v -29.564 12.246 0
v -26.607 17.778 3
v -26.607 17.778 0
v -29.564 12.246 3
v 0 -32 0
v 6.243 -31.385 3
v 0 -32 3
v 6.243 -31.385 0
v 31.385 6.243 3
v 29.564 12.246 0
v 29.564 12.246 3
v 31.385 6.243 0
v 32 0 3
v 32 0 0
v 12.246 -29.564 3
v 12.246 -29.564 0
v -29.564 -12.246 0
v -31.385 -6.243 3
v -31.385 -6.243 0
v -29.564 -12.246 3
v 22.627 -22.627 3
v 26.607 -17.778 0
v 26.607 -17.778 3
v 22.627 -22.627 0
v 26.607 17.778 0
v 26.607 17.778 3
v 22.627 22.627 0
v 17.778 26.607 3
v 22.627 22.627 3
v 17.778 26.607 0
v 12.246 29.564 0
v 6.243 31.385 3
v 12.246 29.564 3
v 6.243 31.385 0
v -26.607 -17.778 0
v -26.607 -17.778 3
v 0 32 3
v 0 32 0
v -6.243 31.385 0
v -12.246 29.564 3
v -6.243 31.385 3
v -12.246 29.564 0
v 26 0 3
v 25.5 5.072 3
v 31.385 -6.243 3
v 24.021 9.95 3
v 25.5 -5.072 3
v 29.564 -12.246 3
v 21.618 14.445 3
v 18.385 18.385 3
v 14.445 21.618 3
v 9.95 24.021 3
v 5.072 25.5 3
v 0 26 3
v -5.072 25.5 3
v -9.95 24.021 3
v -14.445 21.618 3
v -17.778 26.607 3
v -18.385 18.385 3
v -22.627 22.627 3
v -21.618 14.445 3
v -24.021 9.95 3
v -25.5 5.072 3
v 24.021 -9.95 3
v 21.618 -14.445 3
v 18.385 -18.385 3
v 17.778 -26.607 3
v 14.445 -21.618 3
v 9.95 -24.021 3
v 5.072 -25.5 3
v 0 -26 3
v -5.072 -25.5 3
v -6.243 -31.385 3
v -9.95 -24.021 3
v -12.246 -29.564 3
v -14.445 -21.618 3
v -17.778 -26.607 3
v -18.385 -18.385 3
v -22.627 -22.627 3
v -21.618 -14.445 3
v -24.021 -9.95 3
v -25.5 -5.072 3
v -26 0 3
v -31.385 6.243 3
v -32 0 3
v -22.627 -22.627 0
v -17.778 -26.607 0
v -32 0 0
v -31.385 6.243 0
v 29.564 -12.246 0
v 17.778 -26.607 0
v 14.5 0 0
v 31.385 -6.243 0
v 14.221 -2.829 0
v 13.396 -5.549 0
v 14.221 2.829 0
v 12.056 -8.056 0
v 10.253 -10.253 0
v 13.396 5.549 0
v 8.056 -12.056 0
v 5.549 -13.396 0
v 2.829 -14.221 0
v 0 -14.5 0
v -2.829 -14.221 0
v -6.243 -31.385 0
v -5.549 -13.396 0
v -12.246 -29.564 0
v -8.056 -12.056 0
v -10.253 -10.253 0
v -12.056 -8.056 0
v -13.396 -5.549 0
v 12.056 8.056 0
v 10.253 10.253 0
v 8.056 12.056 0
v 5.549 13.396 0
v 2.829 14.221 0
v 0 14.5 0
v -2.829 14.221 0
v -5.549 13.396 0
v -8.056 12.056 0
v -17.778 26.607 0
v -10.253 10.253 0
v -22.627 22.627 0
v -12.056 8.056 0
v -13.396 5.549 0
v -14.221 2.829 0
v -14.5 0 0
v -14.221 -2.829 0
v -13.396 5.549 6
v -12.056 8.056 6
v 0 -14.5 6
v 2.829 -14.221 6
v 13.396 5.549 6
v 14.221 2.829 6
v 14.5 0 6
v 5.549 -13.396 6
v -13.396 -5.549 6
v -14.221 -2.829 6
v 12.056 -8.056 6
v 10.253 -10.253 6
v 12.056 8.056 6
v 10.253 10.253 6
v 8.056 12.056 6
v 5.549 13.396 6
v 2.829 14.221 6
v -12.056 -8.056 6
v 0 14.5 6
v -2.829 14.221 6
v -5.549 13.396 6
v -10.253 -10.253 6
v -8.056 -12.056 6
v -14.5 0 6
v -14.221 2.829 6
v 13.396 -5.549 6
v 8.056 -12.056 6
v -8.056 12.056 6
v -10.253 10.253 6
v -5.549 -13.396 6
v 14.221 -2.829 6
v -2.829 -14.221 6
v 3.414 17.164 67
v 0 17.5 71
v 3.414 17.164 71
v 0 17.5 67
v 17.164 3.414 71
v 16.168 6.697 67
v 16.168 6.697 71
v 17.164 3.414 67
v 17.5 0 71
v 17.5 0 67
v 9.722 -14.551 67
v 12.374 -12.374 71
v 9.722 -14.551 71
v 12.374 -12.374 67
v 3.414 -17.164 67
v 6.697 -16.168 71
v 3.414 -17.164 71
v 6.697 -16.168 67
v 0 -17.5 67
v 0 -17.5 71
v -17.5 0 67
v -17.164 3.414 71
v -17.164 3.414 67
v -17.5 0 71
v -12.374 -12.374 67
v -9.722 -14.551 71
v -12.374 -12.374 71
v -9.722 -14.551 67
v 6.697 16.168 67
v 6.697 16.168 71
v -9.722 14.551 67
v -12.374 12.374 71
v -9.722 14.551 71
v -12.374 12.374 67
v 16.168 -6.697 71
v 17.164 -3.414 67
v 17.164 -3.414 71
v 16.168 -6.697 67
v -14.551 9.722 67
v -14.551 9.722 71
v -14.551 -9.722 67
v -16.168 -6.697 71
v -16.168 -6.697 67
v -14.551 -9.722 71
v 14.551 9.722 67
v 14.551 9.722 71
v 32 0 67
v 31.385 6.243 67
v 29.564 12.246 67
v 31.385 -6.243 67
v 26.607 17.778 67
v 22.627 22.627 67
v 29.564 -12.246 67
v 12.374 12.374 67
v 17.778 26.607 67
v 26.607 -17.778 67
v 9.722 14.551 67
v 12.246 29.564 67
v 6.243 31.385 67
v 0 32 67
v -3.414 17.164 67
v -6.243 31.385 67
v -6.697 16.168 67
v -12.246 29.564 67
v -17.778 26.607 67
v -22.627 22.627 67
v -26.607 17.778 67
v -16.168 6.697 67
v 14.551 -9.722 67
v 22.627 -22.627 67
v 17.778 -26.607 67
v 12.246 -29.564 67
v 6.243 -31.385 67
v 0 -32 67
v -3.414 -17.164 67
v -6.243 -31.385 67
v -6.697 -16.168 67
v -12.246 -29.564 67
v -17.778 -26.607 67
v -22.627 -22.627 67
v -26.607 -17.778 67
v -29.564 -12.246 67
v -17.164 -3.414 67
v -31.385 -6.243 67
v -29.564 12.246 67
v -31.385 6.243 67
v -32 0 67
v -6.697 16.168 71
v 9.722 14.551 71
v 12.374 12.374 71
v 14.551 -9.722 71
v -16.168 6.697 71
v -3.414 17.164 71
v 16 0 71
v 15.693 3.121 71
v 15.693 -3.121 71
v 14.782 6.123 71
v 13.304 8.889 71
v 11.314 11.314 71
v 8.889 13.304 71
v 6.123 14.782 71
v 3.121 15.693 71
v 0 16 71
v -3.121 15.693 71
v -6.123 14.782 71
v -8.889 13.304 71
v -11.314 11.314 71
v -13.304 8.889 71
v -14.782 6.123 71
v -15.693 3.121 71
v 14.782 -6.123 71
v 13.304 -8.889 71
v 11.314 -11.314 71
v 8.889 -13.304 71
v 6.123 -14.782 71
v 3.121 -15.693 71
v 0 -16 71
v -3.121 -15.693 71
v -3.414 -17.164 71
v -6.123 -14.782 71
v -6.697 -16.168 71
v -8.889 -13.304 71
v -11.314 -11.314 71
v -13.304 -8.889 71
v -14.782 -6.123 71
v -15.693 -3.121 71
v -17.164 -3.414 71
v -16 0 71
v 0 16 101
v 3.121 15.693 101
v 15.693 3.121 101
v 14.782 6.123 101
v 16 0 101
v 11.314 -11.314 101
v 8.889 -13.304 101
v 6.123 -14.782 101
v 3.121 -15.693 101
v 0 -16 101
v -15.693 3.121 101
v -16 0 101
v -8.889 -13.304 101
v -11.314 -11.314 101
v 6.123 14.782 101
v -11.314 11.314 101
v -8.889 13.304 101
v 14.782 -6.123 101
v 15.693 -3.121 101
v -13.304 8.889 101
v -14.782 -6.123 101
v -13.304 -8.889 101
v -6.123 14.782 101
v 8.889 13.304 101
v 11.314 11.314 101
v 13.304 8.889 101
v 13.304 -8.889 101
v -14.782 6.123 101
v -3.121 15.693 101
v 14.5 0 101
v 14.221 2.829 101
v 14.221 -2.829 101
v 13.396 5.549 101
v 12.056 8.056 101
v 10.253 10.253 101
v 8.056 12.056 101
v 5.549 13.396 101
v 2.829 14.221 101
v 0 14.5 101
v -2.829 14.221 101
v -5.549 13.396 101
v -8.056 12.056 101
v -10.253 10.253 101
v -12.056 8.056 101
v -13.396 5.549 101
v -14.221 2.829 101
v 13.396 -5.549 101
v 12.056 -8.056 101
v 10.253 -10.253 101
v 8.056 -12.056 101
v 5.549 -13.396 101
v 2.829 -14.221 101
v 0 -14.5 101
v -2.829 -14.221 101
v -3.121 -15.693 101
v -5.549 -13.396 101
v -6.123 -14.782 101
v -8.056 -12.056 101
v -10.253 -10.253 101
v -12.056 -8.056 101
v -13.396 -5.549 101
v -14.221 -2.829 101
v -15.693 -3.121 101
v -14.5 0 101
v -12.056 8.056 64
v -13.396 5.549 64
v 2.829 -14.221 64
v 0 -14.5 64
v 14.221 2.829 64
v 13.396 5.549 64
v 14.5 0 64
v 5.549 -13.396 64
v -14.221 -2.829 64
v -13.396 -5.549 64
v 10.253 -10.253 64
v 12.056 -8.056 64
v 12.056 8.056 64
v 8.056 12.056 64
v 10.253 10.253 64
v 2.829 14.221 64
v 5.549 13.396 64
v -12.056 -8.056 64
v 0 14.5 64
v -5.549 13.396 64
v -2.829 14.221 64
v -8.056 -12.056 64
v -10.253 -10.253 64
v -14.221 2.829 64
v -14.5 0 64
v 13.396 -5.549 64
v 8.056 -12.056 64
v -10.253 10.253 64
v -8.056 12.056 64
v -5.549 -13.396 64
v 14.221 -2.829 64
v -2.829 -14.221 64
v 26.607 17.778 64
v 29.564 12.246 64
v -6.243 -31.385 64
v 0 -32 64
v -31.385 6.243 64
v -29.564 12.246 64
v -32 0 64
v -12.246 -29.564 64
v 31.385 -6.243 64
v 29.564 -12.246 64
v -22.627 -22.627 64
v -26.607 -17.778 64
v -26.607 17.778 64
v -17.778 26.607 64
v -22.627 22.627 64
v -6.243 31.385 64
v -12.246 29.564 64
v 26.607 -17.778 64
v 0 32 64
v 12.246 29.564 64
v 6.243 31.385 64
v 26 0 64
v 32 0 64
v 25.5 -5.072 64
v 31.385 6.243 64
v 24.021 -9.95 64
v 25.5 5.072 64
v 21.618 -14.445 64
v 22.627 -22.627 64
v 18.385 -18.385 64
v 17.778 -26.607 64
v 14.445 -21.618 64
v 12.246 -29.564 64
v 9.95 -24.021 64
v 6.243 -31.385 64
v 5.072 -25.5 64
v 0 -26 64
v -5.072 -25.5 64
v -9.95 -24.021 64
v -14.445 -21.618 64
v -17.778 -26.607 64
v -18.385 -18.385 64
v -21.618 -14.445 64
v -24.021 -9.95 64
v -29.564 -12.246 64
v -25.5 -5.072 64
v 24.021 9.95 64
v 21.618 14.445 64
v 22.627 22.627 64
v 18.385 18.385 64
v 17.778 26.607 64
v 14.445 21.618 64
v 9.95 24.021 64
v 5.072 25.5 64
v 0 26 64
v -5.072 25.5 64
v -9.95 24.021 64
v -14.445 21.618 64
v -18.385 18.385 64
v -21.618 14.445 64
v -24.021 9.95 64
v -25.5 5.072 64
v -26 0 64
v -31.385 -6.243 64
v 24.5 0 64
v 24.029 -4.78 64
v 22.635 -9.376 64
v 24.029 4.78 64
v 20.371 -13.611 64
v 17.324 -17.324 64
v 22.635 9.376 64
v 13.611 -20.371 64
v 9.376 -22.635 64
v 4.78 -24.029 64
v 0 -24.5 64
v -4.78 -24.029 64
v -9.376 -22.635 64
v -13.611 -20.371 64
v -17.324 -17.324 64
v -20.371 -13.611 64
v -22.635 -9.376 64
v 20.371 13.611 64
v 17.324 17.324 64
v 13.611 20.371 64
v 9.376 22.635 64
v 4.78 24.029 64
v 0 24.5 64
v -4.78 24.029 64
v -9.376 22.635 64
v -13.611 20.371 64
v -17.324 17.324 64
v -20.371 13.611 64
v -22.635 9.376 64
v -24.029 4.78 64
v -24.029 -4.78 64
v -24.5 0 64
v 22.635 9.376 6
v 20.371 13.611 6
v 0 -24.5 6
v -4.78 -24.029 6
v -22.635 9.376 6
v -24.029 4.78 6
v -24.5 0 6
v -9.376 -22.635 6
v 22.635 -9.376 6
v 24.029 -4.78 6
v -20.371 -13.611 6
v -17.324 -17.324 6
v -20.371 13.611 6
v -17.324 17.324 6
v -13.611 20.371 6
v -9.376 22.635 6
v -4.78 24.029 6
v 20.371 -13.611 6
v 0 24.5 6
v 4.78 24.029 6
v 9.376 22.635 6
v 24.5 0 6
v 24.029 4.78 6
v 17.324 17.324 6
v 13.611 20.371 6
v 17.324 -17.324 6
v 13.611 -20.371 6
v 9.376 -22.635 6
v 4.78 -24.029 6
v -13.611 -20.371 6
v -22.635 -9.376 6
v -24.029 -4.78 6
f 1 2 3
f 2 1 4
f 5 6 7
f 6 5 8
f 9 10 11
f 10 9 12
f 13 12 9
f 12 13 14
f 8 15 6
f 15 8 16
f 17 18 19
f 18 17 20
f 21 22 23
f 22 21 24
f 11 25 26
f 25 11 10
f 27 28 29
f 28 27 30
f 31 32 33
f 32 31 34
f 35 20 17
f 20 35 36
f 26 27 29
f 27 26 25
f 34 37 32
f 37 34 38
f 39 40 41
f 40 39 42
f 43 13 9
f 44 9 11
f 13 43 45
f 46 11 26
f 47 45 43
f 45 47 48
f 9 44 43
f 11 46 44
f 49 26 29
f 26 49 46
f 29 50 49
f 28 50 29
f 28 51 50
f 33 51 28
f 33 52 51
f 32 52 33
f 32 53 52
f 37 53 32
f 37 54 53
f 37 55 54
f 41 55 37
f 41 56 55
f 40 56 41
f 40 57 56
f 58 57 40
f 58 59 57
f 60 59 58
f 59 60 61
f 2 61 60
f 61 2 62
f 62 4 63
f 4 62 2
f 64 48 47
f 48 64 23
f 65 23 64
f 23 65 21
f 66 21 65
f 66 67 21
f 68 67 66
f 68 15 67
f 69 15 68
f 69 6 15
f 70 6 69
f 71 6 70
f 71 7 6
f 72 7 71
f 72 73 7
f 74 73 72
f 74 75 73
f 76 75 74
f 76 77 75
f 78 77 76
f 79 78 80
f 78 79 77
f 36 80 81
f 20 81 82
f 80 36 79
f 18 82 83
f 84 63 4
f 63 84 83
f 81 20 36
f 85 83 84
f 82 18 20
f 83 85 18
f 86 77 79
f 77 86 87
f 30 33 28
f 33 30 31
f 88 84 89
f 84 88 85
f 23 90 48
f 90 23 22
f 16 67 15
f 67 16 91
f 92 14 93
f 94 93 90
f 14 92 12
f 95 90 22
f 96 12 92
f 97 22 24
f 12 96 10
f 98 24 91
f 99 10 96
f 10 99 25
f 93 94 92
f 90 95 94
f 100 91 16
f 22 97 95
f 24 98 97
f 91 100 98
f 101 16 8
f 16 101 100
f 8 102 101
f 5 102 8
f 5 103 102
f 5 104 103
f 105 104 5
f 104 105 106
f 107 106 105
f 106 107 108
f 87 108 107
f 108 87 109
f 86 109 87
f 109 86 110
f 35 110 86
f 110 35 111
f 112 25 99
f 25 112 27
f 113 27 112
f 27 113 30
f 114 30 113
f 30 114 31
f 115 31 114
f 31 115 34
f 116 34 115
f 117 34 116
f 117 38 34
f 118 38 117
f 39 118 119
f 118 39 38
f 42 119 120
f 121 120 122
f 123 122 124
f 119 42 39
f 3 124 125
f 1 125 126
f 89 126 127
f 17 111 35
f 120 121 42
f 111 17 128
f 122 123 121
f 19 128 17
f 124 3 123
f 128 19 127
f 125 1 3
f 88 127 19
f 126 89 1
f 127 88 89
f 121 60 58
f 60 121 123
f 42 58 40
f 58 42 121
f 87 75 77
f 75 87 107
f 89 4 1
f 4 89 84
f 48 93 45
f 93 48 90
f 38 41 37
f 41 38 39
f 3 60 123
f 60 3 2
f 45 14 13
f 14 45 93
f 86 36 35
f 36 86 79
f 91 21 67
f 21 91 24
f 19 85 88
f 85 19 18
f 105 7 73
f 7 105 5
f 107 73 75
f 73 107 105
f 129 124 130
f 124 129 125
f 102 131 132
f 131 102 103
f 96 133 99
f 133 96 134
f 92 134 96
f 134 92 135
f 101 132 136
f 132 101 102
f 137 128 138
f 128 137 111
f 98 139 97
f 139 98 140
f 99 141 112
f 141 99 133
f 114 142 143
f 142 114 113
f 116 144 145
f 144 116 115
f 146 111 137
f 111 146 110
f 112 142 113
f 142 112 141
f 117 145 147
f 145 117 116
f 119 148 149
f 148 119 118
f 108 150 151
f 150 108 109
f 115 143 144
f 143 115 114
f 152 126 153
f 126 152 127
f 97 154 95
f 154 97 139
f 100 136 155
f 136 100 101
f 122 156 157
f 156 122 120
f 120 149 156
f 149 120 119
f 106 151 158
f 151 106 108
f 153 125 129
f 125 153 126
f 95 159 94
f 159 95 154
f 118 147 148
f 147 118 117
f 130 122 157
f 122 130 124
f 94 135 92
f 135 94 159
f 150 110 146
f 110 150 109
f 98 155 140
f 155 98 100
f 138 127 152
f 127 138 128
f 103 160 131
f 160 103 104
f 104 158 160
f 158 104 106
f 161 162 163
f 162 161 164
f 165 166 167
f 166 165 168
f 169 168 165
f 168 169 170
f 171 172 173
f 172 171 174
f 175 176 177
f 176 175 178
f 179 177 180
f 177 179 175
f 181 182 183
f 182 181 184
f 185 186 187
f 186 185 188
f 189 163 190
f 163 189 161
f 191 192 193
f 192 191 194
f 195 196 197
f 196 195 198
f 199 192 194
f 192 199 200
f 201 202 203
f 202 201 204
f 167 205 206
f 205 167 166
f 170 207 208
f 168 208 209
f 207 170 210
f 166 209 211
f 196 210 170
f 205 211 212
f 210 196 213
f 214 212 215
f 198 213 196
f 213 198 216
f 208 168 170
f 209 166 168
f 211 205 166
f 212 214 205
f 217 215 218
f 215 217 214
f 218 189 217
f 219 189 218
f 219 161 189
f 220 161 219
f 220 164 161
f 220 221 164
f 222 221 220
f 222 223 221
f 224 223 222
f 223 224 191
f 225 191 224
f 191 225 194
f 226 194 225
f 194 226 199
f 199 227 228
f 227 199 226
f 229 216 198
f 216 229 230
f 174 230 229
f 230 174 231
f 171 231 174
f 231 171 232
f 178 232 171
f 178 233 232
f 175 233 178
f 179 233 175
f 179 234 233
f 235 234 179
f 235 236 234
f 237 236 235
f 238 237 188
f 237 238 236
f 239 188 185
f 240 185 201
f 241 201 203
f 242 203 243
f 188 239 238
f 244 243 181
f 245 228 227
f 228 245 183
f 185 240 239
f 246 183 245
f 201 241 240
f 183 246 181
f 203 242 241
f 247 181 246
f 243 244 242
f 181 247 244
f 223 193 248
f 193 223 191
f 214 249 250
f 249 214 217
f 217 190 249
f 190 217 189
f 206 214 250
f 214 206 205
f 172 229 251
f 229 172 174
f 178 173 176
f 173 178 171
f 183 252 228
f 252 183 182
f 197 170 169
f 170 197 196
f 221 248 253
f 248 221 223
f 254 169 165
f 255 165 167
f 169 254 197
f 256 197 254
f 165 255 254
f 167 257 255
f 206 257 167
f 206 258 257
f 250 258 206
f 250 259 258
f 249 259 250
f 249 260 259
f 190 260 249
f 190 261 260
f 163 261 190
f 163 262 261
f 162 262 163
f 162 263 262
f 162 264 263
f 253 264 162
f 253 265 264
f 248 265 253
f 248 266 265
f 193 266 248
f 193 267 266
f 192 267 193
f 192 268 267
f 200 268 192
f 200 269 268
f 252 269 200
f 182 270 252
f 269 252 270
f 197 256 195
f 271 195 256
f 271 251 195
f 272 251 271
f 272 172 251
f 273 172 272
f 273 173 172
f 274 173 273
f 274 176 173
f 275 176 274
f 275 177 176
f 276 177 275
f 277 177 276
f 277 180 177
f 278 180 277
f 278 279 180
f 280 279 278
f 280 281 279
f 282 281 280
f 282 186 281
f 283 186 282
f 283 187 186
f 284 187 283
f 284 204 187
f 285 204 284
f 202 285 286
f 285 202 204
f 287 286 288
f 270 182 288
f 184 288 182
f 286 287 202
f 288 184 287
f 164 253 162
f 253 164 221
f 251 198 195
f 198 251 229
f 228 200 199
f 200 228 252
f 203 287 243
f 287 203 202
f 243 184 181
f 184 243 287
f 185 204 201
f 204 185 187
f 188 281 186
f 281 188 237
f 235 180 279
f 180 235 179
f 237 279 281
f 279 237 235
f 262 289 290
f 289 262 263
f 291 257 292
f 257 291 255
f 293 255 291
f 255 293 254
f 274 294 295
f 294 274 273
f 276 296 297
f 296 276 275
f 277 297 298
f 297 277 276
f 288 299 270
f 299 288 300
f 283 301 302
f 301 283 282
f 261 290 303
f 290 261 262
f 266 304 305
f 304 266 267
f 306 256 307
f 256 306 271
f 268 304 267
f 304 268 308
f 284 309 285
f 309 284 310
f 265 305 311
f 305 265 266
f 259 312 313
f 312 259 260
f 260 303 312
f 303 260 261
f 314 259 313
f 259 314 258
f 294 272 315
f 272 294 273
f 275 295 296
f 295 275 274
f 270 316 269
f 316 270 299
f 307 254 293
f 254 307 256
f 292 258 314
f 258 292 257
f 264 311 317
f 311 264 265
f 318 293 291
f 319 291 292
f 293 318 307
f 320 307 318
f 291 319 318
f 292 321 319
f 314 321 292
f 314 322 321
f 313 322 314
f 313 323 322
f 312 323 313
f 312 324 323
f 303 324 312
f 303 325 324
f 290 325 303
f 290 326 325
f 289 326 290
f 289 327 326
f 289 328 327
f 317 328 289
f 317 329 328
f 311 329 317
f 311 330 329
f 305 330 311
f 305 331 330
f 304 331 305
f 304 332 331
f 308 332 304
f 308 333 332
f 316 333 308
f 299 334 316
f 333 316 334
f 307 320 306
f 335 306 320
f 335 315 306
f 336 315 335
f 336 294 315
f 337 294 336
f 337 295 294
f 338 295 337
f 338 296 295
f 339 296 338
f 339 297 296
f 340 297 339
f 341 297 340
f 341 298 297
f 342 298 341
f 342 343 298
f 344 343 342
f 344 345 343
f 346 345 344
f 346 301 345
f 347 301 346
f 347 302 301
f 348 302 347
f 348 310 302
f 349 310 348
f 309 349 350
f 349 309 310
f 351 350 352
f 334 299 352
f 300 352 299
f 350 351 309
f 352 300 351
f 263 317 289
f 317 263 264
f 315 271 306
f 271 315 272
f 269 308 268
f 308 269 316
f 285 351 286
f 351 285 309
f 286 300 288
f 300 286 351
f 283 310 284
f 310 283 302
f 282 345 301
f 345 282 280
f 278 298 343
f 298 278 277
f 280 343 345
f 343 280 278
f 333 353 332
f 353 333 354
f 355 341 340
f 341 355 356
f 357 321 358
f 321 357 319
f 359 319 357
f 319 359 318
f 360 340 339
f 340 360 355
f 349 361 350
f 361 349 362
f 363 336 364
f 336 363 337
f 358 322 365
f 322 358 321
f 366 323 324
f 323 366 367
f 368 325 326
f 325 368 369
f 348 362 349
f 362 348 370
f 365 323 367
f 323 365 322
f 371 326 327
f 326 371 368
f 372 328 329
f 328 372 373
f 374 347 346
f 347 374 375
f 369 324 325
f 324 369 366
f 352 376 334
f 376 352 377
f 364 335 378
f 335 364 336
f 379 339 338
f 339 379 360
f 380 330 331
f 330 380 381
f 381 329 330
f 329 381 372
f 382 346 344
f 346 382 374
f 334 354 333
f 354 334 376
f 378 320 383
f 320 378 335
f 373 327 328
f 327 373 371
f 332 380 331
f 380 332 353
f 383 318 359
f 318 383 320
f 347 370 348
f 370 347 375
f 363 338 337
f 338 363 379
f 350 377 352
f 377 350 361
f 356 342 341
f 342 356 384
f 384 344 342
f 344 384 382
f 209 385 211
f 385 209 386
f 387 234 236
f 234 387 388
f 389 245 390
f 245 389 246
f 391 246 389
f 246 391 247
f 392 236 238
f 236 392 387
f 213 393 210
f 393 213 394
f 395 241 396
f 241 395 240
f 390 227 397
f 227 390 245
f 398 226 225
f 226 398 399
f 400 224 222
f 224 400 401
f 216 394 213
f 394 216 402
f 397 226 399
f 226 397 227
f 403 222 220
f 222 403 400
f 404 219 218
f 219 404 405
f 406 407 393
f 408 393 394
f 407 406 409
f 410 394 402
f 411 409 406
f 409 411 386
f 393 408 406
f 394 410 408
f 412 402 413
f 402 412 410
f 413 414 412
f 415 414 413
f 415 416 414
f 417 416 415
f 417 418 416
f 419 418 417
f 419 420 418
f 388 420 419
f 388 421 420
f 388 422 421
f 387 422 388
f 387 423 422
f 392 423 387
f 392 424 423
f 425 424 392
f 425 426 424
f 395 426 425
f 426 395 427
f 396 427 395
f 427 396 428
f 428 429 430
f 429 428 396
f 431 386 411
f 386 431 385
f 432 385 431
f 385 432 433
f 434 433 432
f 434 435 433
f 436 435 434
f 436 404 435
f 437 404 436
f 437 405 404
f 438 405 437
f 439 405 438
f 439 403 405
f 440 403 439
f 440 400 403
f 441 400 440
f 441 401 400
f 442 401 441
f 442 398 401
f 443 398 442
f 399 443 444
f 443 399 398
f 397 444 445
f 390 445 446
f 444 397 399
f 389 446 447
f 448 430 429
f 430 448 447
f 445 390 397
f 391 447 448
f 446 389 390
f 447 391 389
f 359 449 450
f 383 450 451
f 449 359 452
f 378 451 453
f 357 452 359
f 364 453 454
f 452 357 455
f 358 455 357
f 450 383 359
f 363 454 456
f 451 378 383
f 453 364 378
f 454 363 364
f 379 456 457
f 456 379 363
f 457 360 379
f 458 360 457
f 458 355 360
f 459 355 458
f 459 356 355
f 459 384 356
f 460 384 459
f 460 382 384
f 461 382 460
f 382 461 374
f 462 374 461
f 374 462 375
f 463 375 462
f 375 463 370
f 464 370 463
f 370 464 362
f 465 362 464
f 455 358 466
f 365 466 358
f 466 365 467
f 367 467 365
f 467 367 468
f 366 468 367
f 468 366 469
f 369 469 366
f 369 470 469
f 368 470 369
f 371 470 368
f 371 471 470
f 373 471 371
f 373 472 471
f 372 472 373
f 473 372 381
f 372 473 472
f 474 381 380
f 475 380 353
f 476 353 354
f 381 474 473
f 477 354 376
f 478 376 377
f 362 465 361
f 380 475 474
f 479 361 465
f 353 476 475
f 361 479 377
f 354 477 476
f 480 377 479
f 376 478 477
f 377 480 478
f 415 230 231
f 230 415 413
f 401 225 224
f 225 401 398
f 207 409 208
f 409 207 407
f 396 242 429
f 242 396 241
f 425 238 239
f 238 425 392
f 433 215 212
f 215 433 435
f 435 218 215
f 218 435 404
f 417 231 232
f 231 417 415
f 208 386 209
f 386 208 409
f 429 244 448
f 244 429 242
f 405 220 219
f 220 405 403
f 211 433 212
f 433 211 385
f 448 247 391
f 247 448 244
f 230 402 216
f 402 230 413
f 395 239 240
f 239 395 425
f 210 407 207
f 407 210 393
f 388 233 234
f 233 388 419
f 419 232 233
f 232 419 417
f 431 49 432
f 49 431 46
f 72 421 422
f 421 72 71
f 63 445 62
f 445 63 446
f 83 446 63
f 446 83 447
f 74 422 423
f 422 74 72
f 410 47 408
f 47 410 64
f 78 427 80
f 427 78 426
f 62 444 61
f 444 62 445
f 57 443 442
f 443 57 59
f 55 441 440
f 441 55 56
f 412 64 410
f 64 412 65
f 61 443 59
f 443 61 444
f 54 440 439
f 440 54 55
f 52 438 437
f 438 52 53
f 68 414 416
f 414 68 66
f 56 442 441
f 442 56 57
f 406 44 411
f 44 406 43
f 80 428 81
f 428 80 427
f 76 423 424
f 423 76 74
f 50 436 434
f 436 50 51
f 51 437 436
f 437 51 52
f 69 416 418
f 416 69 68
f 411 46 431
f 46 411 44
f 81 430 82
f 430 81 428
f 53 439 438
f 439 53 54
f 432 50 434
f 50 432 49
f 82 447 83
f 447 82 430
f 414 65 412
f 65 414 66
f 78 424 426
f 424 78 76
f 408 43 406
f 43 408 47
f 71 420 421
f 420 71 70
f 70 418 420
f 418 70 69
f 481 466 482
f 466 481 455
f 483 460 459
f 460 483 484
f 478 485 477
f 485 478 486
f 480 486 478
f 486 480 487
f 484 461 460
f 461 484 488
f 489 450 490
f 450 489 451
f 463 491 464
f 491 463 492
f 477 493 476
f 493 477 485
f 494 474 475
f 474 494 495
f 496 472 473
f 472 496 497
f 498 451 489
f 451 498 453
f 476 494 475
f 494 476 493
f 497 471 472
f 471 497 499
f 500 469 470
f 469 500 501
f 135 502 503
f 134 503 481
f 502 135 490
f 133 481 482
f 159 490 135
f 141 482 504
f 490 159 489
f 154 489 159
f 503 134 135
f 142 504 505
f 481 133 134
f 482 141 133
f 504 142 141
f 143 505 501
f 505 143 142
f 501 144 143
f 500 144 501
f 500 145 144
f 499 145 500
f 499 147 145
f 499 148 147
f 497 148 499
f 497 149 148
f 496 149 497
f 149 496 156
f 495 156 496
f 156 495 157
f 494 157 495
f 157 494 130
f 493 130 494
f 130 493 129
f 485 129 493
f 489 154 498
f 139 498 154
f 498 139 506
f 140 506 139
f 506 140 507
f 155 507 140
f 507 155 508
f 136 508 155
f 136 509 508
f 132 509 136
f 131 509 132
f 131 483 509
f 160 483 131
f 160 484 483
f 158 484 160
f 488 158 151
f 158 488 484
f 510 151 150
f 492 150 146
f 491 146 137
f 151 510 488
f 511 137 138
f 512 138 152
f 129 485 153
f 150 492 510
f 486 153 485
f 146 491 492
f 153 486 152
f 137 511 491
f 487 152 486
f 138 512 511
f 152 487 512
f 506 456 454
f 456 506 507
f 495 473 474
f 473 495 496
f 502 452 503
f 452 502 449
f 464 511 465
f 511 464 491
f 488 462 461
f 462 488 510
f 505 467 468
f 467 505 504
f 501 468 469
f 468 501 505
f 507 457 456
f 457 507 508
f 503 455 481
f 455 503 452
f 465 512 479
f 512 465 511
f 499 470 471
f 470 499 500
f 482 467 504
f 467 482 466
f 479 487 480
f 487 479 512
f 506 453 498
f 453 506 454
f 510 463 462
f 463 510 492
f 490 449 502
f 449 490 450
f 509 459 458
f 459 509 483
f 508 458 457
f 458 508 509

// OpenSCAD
/* BIBO 3D Printer filament spool adapter
 * by Paul F Sehorne 07/07/2019
 * aethenelle 10/2/2019
 */

part = "all"; // [washer:washer between spool adapter and stock arm cap,spacer:spacer between adapter and end of spool holder,adapter:spool diameter adapter,all:all]

$fn=32;

// OD of printer's stock spool holder
spindle_diameter=29;

// ID of spool
spool_axle_opening_diameter=52;

spool_width=70;

// fits between the sleeve the near end of the stock shaft
spacer_length=34;  
flange_wall_thickness=3;
washer_thickness=3; 

/* [Advanced] */

adapter_length=-1;

//automatically calculate if less than 0
washer_outer_diameter=-1;

large_flange_length=adapter_length < 0 ? spool_width-(2*washer_thickness) : adapter_length;

washer_od = washer_outer_diameter < 0 ? spool_axle_opening_diameter+12 : washer_outer_diameter;


if (part == "all" || part == "washer") {
    // goes between the filament spool and the stock flange moounted on the back of the printer
    solid_washer();
}
    
if (part == "all" || part == "spacer") {
    //takes up space between the adapter at the spool and the end of the stock shaft
    translate([0,0,part == "all" ? washer_thickness+ large_flange_length : 0]) solid_spacer();  
}

if (part == "all" || part == "adapter") {
    // slides through the filament spool
    translate([0,0,part == "all" ? washer_thickness +large_flange_length : 0]) rotate([0,part == "all" ? 180 : 0,0]) solid_adapter();
}

//******** modules *******************/
module solid_washer() {
    difference() {
        cylinder(h=washer_thickness, d=washer_od,center=false);
        translate([0,0,-0.5]) cylinder(h=washer_thickness+1, d=spindle_diameter);  
    }
}


module solid_spacer() {
    difference() {
        union() {
            //flange
            cylinder(h=4, d=spindle_diameter+6,center=false);
            //flange cylinder
            translate([0,0,4]) cylinder(h=spacer_length-4, d=spindle_diameter+flange_wall_thickness,center=false);
        }
        translate([0,0,-0.5]) cylinder(h=spacer_length+1, d=spindle_diameter);  
    }
}

module solid_adapter() {
    difference() {
        union() {
            //bottom flange plate
            solid_washer();
                
            difference() {
                //sleeve/axle
                translate([0,0,washer_thickness]) cylinder(h=large_flange_length-washer_thickness, d=spool_axle_opening_diameter,center=false);
                   
                translate([0,0,flange_wall_thickness]) cylinder(h=large_flange_length-(2*flange_wall_thickness), d=spool_axle_opening_diameter-flange_wall_thickness,center=false);
                   
            }
        }
        translate([0,0,-0.5]) cylinder(h=large_flange_length+1, d=spindle_diameter);  
    }
}
